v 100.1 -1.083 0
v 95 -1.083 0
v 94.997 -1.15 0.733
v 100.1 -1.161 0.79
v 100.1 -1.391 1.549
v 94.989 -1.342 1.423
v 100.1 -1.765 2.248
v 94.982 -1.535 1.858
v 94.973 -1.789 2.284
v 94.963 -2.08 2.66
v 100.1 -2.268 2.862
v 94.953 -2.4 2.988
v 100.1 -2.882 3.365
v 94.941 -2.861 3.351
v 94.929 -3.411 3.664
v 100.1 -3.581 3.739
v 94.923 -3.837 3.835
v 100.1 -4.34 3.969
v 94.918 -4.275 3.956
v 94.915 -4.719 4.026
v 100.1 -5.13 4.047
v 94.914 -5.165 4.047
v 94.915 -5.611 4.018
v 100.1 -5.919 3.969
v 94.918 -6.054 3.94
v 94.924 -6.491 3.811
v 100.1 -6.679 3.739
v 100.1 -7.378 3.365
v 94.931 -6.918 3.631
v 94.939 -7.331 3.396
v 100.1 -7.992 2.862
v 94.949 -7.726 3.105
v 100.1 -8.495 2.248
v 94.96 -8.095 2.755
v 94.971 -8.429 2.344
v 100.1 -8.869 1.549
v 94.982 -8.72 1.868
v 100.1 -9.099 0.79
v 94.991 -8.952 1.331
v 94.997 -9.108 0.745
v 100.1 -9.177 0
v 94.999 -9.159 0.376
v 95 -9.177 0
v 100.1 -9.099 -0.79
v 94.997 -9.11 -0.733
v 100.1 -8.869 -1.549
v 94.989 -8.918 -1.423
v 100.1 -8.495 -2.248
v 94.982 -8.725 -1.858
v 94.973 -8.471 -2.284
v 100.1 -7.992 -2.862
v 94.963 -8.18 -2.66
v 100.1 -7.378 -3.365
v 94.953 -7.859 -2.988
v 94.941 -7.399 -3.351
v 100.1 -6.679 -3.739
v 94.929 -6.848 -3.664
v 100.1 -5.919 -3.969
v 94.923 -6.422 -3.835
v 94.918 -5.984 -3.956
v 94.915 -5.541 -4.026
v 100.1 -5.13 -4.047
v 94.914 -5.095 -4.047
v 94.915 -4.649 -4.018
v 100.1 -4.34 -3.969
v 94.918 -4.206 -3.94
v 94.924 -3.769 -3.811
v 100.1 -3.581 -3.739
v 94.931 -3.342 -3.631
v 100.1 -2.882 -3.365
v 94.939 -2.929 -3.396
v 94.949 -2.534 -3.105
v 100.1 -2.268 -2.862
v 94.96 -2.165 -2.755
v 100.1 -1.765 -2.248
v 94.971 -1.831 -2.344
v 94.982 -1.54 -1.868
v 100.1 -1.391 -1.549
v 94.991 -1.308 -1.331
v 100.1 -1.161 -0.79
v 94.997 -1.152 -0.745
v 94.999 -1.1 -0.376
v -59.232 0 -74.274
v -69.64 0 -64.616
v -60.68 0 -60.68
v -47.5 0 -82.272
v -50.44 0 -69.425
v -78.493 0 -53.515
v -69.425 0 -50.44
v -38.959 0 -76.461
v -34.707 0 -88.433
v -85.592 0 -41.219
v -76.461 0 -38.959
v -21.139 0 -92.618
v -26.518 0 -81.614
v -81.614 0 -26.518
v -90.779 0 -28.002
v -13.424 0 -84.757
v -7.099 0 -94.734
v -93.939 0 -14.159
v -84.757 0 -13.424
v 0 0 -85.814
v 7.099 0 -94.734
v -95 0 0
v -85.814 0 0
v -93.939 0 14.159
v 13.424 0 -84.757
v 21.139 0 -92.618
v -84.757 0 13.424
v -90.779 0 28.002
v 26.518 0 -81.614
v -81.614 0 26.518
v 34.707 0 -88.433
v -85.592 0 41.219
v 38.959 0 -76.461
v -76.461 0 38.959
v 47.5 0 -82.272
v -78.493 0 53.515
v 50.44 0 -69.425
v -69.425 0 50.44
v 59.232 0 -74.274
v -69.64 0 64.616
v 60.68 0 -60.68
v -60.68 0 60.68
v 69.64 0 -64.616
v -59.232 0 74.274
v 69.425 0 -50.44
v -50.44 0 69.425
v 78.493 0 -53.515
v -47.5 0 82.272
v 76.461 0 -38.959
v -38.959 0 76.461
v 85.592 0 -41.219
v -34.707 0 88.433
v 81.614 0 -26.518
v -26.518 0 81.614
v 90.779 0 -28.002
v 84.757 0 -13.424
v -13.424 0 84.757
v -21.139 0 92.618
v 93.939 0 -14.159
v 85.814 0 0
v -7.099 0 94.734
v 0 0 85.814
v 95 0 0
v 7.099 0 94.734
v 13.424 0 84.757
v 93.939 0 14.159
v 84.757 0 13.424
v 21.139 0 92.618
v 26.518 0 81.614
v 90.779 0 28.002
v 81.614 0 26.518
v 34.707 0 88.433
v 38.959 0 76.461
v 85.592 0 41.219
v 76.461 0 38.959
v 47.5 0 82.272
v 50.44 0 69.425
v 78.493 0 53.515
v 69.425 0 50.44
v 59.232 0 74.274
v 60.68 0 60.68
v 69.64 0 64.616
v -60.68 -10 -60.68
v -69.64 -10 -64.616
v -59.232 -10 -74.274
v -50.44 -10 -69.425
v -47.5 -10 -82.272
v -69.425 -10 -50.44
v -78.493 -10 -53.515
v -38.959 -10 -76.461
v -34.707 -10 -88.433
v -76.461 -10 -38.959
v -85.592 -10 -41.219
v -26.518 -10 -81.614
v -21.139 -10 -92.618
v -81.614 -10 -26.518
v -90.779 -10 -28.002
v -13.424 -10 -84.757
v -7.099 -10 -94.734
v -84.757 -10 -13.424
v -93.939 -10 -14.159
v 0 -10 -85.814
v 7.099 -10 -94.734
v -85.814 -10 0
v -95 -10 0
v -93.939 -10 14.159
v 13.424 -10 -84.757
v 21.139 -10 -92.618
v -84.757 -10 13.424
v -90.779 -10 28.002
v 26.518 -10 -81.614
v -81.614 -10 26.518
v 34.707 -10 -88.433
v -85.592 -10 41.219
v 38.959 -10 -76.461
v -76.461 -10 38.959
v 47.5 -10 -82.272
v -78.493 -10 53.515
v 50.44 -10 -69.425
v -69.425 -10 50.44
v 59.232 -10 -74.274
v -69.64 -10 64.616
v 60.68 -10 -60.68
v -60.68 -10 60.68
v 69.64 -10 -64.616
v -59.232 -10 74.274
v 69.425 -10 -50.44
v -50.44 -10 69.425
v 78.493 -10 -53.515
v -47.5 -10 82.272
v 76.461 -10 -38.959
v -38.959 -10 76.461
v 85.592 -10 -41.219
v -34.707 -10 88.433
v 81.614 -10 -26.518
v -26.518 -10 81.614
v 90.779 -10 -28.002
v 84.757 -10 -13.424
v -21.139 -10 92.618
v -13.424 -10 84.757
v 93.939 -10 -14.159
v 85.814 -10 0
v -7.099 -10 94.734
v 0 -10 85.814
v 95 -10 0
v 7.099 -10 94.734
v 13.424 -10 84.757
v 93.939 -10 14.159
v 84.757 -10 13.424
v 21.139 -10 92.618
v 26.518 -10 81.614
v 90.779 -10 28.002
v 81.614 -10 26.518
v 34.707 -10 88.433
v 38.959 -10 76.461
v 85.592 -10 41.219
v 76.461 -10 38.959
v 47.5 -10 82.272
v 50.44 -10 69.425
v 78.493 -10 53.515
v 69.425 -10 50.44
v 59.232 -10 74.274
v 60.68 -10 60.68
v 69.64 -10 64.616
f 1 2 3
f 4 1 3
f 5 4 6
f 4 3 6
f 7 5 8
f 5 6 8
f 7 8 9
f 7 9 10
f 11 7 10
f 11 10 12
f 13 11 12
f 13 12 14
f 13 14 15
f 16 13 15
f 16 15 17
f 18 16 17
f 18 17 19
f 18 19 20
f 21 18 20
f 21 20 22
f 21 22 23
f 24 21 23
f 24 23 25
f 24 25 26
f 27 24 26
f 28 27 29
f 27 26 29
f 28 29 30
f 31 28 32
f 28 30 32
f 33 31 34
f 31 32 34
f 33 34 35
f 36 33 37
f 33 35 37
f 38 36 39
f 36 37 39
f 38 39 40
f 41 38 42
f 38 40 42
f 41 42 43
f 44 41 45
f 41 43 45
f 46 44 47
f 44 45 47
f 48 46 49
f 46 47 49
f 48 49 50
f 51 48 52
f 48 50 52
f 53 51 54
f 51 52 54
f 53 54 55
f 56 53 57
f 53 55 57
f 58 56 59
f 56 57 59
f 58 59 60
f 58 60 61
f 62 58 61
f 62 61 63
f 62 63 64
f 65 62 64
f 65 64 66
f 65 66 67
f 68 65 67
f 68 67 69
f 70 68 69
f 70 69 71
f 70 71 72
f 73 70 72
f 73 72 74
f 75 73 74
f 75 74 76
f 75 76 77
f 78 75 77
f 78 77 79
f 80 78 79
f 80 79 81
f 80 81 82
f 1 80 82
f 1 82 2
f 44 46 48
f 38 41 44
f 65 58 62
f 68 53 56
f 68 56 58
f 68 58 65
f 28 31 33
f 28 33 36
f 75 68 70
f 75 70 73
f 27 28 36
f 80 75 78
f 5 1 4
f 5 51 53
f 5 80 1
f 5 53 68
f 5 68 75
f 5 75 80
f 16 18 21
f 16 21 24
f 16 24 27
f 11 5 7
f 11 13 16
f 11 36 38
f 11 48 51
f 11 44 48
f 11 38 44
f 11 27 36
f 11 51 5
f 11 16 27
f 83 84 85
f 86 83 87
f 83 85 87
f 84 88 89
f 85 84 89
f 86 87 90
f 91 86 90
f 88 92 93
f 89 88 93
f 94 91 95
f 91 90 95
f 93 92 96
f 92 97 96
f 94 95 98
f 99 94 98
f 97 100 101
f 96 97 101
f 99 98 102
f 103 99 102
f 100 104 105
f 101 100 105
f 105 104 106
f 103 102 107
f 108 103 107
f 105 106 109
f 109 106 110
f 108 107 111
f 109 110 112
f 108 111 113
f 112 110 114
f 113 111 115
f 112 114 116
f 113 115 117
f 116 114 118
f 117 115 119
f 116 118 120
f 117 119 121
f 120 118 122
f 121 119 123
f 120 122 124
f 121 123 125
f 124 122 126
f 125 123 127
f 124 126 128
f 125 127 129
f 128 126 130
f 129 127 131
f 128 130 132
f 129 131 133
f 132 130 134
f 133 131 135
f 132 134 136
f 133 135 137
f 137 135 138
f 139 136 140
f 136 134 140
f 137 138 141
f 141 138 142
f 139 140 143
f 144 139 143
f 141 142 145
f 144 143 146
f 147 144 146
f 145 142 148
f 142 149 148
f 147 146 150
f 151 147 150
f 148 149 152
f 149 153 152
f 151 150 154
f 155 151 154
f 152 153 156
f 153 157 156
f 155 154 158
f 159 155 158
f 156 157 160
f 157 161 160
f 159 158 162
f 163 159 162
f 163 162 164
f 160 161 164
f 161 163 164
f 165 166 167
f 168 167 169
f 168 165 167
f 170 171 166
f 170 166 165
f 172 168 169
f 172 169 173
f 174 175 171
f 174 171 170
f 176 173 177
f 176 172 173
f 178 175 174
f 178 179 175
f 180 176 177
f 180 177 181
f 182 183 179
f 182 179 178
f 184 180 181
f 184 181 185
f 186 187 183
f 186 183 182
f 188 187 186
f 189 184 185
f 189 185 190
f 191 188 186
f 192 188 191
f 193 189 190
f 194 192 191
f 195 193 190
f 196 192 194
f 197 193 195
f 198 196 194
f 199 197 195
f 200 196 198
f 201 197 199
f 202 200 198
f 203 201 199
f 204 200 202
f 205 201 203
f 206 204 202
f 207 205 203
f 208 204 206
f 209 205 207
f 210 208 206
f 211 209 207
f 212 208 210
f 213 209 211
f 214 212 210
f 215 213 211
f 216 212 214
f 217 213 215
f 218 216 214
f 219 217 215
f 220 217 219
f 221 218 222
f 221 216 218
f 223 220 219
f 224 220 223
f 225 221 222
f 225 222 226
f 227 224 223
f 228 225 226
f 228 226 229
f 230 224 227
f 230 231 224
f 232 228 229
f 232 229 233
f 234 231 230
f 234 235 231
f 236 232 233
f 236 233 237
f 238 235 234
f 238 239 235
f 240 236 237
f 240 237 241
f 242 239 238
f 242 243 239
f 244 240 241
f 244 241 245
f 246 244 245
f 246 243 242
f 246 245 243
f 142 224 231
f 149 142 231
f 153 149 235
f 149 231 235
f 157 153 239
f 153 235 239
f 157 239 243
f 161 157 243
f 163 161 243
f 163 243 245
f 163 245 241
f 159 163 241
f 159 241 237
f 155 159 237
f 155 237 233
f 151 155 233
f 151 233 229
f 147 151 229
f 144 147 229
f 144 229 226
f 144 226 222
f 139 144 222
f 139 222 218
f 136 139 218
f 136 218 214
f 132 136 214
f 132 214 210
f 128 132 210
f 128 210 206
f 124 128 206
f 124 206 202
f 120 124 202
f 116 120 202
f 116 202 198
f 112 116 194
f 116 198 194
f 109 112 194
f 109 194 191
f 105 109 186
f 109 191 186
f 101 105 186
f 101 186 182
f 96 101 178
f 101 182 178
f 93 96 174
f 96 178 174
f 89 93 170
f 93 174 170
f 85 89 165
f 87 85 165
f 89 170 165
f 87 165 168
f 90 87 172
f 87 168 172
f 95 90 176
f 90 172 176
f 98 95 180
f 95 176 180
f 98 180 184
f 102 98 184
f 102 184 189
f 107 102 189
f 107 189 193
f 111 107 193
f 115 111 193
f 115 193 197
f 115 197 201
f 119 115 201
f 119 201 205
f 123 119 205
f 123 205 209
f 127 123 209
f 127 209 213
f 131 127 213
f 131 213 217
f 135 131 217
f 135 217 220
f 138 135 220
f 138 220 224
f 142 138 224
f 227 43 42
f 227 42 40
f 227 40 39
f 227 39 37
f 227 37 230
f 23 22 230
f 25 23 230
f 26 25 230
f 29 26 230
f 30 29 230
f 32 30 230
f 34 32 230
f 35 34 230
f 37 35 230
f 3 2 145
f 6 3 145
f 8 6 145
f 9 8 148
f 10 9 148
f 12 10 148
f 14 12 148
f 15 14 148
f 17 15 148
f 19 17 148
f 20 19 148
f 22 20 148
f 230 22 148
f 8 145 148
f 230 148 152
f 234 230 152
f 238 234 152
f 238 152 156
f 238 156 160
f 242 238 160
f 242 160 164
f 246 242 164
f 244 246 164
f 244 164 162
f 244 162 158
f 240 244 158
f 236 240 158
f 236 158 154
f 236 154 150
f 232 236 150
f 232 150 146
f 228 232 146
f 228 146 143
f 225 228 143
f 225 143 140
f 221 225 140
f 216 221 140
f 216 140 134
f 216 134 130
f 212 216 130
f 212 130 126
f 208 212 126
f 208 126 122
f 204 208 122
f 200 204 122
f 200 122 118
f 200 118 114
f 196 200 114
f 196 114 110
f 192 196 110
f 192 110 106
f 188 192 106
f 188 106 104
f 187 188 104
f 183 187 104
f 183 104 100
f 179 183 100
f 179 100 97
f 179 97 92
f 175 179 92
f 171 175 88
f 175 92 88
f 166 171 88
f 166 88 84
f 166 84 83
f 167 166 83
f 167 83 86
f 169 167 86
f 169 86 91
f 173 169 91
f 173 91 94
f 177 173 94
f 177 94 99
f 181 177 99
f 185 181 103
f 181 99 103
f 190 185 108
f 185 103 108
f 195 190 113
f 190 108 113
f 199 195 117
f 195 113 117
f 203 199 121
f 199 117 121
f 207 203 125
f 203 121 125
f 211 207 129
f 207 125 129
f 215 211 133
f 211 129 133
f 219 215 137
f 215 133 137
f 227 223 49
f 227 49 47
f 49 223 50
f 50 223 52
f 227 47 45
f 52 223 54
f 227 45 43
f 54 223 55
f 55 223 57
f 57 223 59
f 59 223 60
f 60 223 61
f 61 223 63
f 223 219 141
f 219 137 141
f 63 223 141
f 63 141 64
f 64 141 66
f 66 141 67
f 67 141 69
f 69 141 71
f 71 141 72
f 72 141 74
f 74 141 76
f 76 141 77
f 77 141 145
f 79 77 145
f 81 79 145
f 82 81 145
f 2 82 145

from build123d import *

# Parameters (mm, degrees)
F0_R     = 95
F1_DEPTH = 10
F2_R     = 85.813786
F3_DEPTH = 25
F5_R     = 4.046954
F6_DEPTH = 10


with BuildPart() as f1:
    # F0 (on Front) → F1 (new body)
    with BuildSketch(Plane.XZ):
        Circle(F0_R)
    extrude(amount=F1_DEPTH)

    # F2 (on face) → F3 (cut)
    with BuildSketch(Plane.XZ.offset(10)):
        Circle(F2_R)
    extrude(amount=-F3_DEPTH, mode=Mode.SUBTRACT)

    # F5 (on offset) → F6 (join)
    with BuildSketch(Plane.YZ.offset(90.1)):
        with Locations((-5.129917, 0)):
            Circle(F5_R)
    extrude(amount=F6_DEPTH)


solid = f1.part
